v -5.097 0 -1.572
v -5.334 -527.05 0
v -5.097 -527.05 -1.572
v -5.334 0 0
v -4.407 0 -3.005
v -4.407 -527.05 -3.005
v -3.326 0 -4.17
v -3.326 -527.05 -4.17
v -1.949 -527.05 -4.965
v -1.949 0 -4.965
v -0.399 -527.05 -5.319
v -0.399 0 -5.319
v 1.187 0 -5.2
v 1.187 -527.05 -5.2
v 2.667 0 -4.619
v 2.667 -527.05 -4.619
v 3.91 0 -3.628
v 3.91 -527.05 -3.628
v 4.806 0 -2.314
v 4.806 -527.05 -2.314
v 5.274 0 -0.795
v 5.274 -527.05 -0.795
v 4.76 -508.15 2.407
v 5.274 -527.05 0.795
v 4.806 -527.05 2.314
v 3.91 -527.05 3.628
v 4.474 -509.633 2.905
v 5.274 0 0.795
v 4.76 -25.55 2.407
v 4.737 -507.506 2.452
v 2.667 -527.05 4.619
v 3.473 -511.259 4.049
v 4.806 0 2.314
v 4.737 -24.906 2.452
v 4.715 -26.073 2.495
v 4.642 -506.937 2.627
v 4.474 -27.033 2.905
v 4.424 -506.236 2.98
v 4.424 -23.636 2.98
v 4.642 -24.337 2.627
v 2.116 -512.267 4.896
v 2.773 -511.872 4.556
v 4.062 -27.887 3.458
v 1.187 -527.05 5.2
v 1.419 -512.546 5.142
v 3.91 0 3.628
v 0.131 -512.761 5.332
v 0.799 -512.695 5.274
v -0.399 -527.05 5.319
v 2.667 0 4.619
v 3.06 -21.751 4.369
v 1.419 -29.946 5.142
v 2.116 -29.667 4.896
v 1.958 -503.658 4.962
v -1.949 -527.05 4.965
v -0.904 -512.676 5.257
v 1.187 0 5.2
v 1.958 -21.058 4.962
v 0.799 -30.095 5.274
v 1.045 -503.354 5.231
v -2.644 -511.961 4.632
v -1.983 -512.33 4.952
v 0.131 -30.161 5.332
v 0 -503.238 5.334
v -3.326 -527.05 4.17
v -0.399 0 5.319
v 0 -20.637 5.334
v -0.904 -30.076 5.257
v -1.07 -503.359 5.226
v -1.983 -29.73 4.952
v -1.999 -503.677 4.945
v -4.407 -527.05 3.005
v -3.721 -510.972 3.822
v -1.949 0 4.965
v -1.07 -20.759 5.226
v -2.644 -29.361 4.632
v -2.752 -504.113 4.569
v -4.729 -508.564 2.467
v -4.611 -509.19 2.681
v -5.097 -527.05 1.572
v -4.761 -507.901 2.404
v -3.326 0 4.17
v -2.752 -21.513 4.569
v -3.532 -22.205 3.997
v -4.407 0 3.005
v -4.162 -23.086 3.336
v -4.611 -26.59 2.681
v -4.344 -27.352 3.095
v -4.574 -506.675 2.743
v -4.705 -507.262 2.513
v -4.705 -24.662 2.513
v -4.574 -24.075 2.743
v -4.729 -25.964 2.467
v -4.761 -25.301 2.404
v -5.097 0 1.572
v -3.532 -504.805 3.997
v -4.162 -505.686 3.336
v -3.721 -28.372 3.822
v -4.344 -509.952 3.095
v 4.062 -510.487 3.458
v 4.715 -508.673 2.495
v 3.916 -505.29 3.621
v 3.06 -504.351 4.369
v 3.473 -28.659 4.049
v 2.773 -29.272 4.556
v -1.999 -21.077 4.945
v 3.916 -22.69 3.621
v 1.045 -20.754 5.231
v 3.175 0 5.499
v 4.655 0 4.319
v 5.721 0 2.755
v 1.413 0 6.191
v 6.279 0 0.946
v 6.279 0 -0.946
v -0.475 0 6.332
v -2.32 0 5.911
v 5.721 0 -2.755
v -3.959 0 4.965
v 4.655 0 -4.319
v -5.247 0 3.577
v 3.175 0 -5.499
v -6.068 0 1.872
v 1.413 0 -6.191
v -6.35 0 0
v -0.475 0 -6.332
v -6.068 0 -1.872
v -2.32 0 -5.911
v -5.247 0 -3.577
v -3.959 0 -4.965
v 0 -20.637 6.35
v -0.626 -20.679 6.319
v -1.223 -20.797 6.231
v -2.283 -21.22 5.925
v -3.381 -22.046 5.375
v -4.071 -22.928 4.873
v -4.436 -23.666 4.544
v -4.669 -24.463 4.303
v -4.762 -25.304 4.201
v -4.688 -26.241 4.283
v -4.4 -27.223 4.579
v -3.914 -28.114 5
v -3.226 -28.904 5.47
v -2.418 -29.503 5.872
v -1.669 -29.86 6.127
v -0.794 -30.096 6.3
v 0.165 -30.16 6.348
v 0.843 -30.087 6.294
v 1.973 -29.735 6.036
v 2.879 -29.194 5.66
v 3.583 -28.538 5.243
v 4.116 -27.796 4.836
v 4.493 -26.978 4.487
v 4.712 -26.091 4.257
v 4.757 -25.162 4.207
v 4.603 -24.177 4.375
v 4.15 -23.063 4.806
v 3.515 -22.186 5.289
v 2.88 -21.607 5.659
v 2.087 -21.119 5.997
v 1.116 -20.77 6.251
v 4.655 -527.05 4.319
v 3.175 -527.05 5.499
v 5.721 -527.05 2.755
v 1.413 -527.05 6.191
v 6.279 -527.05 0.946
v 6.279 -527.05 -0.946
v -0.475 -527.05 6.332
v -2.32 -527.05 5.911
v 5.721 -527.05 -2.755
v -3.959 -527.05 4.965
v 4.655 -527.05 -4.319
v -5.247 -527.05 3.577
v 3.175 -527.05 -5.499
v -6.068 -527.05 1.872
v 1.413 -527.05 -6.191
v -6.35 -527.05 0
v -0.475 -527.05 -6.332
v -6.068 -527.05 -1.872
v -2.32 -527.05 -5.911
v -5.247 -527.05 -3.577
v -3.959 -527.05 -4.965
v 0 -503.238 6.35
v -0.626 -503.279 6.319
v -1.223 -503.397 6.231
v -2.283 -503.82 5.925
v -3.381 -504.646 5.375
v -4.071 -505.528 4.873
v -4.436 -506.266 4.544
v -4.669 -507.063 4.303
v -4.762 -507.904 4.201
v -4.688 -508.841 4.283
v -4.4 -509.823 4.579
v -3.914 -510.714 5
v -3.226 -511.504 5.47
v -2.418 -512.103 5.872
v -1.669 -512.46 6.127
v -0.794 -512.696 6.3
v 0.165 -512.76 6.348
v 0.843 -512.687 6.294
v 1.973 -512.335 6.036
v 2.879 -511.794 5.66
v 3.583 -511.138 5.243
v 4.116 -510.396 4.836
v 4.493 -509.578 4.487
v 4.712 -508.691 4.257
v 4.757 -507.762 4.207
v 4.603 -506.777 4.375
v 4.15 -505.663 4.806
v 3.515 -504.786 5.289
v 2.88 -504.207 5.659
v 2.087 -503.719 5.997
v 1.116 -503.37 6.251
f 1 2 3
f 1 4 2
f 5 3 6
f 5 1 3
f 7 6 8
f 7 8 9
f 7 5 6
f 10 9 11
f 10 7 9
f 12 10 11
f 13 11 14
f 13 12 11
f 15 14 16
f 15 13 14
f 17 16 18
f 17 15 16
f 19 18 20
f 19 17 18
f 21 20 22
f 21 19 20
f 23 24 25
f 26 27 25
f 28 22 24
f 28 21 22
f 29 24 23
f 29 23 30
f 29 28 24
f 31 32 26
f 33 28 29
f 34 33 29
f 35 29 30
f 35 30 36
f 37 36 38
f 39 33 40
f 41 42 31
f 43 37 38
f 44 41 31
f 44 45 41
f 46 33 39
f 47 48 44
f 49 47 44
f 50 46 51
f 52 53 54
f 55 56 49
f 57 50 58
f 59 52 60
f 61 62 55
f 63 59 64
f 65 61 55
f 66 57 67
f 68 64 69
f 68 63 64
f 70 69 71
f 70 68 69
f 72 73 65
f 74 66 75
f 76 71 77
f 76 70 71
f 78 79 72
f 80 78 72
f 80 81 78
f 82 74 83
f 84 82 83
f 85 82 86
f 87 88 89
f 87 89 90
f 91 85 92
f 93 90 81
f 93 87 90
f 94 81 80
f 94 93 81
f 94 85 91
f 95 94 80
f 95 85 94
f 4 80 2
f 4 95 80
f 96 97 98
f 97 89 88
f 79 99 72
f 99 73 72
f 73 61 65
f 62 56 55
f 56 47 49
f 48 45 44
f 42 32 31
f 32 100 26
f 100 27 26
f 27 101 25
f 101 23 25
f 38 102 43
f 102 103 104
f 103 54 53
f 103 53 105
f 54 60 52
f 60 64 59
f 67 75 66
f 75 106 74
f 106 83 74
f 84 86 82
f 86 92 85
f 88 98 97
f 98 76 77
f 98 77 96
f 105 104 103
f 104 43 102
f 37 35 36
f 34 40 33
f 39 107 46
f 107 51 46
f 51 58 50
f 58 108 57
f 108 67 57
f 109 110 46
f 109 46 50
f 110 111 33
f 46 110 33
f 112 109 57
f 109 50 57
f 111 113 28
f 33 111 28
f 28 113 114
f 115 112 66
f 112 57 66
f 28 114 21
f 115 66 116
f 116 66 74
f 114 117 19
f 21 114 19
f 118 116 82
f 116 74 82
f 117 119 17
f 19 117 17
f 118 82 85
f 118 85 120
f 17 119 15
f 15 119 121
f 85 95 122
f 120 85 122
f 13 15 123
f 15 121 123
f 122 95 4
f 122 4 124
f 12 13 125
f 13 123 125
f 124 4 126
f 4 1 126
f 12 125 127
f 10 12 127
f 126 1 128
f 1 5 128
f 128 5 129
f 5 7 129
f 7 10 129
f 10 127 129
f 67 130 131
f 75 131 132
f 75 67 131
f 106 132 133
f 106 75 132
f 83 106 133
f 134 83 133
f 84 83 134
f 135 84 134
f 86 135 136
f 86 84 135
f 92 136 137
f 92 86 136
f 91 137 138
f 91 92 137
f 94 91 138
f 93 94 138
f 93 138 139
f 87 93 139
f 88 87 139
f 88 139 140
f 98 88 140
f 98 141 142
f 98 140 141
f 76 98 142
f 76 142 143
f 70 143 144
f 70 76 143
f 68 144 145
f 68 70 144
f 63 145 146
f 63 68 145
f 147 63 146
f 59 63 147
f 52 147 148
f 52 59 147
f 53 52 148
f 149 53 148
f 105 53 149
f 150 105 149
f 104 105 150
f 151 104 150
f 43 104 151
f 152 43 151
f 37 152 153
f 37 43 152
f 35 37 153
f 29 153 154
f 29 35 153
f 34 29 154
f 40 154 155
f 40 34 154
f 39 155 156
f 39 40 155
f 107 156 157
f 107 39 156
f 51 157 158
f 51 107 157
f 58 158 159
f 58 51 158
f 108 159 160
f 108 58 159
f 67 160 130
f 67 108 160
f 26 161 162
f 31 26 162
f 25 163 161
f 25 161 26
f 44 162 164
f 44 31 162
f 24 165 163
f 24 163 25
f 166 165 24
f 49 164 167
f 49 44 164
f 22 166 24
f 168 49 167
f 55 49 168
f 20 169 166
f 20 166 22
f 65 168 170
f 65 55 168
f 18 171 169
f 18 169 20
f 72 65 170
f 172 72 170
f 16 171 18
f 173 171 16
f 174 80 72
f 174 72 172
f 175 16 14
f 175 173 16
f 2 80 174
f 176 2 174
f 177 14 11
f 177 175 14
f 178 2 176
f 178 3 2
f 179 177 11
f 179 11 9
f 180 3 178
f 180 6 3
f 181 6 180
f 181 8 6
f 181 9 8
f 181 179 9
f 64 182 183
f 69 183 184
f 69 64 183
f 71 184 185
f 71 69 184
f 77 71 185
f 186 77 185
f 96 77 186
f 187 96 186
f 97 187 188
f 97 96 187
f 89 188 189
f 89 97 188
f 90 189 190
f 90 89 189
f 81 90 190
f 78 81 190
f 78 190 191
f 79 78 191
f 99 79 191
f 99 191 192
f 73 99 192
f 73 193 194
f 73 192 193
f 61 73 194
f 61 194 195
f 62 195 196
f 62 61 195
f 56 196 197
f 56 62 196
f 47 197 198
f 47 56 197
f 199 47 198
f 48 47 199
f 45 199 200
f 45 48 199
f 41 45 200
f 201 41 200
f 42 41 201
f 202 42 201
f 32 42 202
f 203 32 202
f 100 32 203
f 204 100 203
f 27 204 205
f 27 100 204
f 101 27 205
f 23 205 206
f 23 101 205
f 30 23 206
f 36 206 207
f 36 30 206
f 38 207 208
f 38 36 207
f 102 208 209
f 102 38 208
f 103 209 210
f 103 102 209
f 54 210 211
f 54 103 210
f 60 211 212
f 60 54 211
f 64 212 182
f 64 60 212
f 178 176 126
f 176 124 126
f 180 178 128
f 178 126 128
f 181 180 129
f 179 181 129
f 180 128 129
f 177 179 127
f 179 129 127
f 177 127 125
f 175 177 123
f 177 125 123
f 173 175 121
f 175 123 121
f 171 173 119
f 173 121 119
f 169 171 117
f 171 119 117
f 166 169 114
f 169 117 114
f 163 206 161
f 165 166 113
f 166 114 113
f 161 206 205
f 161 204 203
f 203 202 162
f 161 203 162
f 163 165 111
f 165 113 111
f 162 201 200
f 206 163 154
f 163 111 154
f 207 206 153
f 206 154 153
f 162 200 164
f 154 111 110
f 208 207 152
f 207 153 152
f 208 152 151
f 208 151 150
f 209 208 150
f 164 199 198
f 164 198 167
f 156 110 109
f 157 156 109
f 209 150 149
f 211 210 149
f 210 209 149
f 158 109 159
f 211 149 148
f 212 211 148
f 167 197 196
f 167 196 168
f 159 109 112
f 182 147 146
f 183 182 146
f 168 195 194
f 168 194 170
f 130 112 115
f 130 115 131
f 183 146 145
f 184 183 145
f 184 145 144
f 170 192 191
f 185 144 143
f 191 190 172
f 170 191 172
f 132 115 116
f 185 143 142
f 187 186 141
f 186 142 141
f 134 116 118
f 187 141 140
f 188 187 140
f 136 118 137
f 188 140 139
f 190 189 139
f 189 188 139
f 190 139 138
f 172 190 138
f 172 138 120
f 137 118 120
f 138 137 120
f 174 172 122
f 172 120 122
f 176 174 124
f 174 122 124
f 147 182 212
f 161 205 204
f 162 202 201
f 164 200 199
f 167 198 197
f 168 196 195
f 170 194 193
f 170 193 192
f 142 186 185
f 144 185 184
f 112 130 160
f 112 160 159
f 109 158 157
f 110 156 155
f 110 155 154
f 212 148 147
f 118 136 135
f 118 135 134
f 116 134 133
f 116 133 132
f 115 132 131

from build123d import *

# Parameters (mm, degrees)
SKETCH1_W                             = 1.016
SKETCH1_H                             = 527.05
F_3_8_0_375_DIAMETER_HOLE1_AT_2_COUNT = 2
F_3_8_0_375_DIAMETER_HOLE1_AT_2_PITCH = 482.6


with BuildPart() as part:
    # Sketch1 → Revolve1 (revolve)
    with BuildSketch(Plane.XY):
        with Locations((-5.842, -263.525)):
            Rectangle(SKETCH1_W, SKETCH1_H)
    revolve(axis=Axis((0, 0, 0), (0, -1, 0)))

    # Sketch3 → 3/8 (0.375) Diameter Hole1 (revolve, cut)
    with BuildSketch(Plane(origin=(0, -508, 0), x_dir=(0, 1, 0), z_dir=(1, 0, 0))):
        Polygon((0, 0), (0, 9.211598698), (4.7625, 6.35), (4.7625, 0), align=None)
    f_3_8_0_375_diameter_hole1 = revolve(axis=Axis((0, -508, -6.35), (0, 0, 1)), mode=Mode.SUBTRACT)

    # 3/8 (0.375) Diameter Hole1 at 2: 3/8 (0.375) Diameter Hole1 ×2
    with Locations(*[(0, i * F_3_8_0_375_DIAMETER_HOLE1_AT_2_PITCH, 0) for i in range(1, F_3_8_0_375_DIAMETER_HOLE1_AT_2_COUNT)]):
        add(f_3_8_0_375_diameter_hole1, mode=Mode.SUBTRACT)


solid = part.part
